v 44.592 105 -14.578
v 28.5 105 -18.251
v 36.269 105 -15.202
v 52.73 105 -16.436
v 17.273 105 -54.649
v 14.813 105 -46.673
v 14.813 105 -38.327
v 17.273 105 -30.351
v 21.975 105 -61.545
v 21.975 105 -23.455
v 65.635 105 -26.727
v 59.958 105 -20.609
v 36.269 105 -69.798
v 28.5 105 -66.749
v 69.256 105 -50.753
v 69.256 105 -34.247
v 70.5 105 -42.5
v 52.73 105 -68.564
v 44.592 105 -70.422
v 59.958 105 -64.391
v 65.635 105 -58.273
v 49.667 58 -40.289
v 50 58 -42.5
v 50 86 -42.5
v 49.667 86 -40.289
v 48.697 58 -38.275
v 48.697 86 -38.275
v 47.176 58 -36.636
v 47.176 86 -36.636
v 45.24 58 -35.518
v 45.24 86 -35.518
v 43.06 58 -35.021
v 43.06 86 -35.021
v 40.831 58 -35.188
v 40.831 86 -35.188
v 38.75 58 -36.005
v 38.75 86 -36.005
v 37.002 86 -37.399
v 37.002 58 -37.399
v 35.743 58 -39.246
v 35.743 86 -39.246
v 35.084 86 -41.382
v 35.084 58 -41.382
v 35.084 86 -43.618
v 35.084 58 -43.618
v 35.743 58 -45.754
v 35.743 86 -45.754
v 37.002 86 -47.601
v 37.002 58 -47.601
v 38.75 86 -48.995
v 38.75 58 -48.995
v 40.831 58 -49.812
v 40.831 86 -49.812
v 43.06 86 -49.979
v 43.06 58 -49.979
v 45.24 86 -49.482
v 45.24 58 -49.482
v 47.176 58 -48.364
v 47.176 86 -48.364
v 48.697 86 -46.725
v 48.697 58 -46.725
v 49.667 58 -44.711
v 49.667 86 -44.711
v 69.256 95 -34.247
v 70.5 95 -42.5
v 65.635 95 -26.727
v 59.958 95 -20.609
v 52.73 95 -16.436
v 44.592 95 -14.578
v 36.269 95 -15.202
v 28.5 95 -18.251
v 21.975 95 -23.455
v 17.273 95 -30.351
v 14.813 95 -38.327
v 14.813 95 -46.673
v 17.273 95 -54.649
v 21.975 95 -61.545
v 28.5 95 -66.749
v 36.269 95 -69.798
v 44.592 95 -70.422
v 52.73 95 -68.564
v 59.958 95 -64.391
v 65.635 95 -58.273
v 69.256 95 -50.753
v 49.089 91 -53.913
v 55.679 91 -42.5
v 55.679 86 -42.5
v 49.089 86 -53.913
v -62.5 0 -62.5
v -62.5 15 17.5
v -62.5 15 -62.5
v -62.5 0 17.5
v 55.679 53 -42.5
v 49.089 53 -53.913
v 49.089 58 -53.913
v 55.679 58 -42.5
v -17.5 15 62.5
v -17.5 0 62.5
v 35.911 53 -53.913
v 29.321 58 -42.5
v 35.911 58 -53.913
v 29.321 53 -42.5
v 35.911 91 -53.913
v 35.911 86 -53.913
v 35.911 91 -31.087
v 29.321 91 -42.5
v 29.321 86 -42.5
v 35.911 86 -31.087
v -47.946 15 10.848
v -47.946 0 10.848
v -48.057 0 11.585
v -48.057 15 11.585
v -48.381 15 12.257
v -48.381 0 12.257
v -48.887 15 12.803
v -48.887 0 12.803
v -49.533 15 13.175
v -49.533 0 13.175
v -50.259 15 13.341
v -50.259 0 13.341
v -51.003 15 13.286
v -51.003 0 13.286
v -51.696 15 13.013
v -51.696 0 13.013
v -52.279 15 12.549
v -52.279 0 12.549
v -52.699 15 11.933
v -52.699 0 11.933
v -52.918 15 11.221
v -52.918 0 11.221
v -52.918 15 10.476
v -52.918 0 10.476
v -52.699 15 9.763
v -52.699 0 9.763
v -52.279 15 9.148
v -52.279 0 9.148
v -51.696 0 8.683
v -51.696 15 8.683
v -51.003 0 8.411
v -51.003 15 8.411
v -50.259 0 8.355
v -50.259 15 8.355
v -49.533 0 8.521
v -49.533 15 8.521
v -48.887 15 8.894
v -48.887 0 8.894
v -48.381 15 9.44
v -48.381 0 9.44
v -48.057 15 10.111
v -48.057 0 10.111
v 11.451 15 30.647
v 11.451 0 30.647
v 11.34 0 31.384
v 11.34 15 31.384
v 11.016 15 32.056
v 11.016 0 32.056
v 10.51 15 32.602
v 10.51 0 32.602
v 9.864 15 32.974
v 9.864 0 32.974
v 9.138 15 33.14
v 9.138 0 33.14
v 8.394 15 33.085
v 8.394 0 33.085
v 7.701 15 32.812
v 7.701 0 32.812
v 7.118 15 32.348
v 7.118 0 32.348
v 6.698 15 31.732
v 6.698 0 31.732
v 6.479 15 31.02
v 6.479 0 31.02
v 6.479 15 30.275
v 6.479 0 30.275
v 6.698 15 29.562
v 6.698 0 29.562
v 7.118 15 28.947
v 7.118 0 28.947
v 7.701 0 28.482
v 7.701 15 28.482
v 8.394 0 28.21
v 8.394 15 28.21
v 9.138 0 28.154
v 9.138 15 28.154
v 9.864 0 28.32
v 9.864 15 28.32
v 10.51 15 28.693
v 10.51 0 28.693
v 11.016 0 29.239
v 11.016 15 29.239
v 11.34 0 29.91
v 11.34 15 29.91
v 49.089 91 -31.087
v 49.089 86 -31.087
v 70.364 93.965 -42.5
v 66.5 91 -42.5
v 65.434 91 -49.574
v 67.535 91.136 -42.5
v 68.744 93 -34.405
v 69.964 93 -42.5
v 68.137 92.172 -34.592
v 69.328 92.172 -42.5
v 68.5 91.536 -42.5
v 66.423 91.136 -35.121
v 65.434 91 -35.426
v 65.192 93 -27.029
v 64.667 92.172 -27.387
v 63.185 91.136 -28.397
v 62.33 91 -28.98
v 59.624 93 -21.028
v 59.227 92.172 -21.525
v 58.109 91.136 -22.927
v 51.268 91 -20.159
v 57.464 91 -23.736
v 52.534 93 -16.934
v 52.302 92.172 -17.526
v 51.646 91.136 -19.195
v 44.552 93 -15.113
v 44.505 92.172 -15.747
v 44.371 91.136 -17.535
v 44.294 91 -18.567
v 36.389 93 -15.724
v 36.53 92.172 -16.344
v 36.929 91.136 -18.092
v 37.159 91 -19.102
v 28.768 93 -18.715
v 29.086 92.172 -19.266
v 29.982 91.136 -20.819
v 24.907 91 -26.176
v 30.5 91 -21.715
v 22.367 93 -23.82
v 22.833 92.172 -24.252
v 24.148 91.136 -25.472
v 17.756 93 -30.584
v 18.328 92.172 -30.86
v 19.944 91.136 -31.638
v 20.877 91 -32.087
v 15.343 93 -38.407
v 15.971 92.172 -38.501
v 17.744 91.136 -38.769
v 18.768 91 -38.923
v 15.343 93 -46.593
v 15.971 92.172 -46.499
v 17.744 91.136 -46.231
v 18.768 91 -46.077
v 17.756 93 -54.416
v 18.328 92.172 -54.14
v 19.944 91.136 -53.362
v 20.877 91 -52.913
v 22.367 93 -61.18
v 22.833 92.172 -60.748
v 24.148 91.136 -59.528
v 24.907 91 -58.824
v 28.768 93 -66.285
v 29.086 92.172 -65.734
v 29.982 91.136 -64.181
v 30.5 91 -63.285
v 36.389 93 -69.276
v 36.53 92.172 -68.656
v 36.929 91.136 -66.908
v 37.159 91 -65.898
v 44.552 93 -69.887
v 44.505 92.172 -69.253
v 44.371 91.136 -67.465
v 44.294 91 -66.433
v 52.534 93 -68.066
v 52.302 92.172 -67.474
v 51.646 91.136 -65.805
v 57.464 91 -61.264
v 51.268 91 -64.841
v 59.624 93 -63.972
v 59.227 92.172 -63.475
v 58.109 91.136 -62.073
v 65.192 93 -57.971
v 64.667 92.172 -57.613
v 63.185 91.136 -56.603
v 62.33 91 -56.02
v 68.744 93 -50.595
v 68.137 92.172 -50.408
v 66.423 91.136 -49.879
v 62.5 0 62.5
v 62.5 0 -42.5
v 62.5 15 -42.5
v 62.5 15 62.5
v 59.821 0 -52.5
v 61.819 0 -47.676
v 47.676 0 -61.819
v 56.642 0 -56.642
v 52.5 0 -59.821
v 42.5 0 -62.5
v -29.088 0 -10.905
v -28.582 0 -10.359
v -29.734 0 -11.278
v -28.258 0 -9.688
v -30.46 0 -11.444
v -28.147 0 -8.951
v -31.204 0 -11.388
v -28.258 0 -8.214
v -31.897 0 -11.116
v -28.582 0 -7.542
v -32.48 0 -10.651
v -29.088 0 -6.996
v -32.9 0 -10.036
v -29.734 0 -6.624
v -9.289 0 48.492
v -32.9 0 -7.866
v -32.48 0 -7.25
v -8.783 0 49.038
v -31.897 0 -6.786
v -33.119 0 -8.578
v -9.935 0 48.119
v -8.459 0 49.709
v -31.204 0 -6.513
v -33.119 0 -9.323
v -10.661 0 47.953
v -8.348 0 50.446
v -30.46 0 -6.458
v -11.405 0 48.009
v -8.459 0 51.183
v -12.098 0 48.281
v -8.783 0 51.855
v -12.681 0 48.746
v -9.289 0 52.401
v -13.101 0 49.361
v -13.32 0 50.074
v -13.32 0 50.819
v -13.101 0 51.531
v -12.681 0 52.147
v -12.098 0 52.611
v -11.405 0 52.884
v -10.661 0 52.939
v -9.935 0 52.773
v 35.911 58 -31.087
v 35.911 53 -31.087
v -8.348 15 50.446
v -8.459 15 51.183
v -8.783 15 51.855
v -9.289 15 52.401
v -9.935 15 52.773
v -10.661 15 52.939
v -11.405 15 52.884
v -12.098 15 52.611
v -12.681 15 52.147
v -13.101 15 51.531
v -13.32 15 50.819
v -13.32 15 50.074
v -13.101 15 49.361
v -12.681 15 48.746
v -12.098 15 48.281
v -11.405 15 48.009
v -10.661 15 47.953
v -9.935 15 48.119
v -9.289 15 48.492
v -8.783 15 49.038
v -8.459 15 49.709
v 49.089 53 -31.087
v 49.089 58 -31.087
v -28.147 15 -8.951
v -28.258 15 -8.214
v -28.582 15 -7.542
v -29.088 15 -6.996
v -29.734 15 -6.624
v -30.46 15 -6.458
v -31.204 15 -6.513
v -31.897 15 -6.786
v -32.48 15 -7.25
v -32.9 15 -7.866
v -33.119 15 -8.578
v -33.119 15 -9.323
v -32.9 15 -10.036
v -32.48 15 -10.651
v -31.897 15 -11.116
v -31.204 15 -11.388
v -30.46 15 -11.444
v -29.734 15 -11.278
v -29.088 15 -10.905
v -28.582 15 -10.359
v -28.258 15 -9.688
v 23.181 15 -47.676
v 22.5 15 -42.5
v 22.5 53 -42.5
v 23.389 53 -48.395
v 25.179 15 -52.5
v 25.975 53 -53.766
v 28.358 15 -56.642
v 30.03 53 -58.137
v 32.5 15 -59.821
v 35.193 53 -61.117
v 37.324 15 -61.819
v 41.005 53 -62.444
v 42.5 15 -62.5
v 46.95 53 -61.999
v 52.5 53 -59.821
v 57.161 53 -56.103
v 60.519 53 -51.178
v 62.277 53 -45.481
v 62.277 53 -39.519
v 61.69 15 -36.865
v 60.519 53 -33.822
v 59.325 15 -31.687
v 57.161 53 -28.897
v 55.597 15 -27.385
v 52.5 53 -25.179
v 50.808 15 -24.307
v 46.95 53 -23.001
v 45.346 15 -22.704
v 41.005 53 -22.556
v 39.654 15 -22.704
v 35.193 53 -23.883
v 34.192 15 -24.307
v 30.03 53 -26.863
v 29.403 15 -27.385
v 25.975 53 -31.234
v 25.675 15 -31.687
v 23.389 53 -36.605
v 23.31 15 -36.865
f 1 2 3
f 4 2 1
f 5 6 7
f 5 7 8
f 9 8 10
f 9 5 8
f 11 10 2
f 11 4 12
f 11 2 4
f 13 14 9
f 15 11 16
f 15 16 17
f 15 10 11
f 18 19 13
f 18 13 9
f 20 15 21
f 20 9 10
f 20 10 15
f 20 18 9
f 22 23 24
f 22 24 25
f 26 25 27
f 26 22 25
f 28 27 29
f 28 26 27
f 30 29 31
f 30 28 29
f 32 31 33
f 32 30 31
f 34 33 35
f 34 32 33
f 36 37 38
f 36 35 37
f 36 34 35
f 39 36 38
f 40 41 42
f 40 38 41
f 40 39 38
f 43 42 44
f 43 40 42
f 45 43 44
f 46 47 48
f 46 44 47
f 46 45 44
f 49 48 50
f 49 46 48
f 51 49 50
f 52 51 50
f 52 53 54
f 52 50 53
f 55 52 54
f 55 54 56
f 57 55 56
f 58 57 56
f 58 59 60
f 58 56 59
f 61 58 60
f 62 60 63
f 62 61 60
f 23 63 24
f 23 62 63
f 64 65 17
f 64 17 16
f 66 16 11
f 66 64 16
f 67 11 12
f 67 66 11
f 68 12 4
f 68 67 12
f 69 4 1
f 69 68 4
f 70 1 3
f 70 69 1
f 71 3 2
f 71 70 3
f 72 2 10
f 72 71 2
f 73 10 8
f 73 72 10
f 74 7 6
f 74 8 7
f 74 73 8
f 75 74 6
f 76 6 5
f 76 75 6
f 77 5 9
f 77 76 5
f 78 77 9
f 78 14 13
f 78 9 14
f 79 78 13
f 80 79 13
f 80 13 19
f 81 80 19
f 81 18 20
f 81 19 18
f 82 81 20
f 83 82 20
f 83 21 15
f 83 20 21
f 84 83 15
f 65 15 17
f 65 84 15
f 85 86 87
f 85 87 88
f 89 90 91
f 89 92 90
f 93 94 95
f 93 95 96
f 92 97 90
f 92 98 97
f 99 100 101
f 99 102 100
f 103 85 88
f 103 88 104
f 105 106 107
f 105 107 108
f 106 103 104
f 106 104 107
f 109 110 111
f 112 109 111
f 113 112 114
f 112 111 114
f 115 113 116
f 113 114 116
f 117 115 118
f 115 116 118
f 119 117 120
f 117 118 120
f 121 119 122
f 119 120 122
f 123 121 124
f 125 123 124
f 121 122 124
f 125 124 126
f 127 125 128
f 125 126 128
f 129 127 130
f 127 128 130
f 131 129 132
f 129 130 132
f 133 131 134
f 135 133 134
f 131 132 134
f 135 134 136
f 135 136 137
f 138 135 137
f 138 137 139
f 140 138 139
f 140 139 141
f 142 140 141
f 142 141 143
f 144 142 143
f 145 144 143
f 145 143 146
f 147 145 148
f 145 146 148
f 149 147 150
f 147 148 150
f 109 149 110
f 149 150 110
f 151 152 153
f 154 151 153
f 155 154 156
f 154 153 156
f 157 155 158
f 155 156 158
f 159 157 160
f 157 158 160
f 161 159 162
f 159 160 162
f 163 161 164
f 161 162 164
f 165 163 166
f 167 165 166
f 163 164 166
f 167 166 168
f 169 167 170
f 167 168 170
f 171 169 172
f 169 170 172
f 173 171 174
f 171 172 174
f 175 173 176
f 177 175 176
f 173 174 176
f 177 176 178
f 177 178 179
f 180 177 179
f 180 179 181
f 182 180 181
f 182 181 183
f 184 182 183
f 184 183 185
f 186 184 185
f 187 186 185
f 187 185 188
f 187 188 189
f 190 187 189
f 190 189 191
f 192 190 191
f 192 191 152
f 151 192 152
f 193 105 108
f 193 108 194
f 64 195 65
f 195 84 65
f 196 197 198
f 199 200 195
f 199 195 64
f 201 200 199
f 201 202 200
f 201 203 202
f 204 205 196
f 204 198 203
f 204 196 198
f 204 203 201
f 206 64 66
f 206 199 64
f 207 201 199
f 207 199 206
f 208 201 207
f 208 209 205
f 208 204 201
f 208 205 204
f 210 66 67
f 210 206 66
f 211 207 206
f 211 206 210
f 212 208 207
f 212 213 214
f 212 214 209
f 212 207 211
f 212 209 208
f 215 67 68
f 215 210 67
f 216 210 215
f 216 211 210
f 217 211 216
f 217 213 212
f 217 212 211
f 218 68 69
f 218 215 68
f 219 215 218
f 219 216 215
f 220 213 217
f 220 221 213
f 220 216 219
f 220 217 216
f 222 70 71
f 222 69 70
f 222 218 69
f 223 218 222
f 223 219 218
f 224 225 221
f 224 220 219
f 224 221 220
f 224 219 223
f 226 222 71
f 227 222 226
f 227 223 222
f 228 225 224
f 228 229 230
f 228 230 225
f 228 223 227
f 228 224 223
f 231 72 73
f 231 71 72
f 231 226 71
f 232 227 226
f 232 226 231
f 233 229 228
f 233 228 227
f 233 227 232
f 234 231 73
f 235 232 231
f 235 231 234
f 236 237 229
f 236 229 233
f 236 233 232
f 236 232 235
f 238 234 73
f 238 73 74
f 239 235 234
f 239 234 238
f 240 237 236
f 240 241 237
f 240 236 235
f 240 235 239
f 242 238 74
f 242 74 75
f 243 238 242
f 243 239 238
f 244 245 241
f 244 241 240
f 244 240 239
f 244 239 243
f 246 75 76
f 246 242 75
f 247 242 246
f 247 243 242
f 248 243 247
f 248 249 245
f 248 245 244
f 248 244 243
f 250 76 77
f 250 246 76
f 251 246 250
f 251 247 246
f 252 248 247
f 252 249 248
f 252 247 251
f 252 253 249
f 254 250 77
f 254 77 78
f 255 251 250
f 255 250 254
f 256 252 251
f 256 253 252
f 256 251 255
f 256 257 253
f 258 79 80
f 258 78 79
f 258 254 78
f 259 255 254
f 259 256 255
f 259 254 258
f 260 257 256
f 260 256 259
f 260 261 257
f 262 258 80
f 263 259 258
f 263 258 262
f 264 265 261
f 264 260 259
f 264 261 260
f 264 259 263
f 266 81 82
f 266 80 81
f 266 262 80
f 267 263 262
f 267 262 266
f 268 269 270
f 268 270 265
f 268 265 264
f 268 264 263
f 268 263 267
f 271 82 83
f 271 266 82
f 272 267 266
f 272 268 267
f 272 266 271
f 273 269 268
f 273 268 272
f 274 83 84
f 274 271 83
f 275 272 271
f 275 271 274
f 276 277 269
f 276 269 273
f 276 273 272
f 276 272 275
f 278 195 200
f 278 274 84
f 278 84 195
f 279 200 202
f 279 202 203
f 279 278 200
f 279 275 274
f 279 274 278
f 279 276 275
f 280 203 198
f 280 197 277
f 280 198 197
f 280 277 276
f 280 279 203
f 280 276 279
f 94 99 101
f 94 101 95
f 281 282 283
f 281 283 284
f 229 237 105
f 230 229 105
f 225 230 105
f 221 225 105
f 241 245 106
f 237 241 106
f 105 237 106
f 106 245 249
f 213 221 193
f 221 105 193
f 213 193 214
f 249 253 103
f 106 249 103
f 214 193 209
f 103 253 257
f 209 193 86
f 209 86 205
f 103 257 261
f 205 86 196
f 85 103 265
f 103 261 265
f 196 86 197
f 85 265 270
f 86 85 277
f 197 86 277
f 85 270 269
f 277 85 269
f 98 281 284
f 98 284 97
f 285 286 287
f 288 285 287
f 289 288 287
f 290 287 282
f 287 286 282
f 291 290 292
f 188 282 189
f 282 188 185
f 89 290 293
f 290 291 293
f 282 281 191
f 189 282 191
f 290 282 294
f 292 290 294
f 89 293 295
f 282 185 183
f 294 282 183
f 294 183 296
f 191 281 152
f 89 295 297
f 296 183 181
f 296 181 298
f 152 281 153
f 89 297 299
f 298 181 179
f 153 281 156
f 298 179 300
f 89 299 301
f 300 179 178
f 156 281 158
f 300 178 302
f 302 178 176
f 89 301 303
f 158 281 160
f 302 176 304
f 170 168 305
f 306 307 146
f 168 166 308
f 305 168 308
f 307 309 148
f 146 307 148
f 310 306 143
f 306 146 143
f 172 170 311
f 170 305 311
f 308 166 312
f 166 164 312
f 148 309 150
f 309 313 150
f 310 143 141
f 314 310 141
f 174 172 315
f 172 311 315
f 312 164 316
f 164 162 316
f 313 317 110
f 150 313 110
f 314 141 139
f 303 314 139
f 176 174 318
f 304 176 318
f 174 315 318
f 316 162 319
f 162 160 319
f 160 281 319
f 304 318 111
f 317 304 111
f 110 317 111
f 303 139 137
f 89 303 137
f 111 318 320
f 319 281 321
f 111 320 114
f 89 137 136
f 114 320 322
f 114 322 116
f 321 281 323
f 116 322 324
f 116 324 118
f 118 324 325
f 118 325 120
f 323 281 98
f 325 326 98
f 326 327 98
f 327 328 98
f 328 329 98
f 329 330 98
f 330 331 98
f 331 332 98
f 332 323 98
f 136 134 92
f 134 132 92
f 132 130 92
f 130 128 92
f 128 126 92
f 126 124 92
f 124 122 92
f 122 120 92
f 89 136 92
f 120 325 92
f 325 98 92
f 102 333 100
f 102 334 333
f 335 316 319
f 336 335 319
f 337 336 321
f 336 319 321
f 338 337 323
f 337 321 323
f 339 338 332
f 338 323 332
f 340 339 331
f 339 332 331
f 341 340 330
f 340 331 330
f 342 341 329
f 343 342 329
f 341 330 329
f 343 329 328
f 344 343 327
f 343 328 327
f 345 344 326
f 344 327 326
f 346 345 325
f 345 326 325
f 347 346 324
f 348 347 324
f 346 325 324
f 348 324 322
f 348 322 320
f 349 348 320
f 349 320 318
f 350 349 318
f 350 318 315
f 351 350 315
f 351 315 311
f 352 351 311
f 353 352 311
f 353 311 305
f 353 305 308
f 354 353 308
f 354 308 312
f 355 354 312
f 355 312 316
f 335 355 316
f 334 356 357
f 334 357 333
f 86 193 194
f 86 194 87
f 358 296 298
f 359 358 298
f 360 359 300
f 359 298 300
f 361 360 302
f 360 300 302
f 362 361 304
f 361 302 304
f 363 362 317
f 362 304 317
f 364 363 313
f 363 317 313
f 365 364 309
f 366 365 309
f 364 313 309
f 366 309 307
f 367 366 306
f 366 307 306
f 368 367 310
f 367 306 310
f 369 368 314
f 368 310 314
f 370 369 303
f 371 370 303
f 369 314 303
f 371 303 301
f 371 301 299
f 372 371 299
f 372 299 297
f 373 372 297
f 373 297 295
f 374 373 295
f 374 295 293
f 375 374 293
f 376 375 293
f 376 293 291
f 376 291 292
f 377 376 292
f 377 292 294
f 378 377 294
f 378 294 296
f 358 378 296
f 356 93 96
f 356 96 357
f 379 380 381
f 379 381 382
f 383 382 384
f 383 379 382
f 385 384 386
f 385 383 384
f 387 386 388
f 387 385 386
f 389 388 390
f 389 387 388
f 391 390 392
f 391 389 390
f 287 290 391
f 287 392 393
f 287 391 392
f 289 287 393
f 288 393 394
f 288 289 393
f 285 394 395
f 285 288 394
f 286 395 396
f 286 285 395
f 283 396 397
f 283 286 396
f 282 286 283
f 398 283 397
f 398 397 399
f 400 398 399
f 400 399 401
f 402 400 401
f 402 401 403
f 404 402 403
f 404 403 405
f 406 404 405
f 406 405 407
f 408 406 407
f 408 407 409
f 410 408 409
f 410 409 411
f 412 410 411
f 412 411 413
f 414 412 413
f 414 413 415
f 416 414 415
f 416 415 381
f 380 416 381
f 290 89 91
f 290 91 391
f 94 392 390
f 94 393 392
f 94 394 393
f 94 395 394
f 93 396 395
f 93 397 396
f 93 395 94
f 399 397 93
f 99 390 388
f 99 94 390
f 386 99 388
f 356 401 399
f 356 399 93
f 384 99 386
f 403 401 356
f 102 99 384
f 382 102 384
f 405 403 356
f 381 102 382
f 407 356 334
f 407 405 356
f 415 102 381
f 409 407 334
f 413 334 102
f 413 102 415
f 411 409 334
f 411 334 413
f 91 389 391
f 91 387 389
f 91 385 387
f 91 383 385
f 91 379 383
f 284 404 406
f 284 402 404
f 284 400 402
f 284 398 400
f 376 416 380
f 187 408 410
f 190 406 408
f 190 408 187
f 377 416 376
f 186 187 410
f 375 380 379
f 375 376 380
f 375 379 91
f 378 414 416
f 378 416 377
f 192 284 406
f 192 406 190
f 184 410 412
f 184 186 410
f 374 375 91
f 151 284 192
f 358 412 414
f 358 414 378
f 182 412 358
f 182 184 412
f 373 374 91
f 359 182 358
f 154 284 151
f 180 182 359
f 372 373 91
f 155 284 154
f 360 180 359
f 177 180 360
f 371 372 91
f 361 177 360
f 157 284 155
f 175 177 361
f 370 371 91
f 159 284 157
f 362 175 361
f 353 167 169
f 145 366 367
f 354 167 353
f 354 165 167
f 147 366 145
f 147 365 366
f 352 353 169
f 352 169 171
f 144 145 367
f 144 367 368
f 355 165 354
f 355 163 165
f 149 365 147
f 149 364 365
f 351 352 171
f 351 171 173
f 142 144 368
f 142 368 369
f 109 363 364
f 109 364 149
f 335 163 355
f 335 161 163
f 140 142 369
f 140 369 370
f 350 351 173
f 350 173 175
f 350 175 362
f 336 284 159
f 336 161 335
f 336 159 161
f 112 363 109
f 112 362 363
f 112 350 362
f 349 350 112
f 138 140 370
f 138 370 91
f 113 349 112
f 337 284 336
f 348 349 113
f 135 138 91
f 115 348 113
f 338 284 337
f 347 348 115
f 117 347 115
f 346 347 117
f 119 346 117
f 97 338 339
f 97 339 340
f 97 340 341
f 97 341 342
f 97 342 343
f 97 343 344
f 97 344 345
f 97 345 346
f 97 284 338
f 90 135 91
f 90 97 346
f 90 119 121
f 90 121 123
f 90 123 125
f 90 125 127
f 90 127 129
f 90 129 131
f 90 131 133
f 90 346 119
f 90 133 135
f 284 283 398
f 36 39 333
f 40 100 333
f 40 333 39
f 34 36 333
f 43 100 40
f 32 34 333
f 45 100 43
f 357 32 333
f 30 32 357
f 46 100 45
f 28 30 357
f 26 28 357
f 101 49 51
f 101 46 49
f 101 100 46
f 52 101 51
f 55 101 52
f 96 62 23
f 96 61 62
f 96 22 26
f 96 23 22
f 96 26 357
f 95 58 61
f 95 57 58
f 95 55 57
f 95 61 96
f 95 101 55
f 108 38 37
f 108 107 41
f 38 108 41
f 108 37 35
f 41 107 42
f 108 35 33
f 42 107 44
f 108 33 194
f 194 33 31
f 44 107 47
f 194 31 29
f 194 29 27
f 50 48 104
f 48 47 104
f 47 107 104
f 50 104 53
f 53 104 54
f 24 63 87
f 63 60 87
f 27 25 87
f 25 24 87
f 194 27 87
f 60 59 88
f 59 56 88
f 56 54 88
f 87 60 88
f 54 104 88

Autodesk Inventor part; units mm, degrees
ref_plane "YZ Plane" through (0, 0, 0) normal (1, 0, 0) x (0, 1, 0)
ref_plane "XZ Plane" through (0, 0, 0) normal (0, 1, 0) x (-1, 0, 0)
ref_plane "XY Plane" through (0, 0, 0) normal (0, 0, 1) x (1, 0, 0)
sketch "スケッチ1" plane through (0, 0, 0) normal (0, 1, 0) x (-1, 0, 0)
  line L0 (62.5, -62.5) -> (-42.5, -62.5)
  line L1 (-62.5, -42.5) -> (-62.5, 62.5)
  line L2 (-62.5, 62.5) -> (62.5, 62.5)
  line L3 (62.5, 62.5) -> (62.5, -62.5)
  line L4 (62.5, -62.5) -> (-62.5, 62.5) construction
  line L5 (-62.5, -62.5) -> (62.5, 62.5) construction
  line L6 (17.5, 62.5) -> (62.5, 17.5)
  circle A0 centre (-42.5, -42.5) radius 20
  point P0 (0, 0)
  dimension "d0" = 125
  dimension "d1" = 125
  dimension "d2" = 80
  dimension "d3" = 80
  dimension "d4" = 40
  dimension "d5" = 20
extrude "押し出し1" add sketch "スケッチ1" along normal blind 15 contours L0 A0 L1 L2 L6 L3
extrude "押し出し2" add sketch "スケッチ1" along normal blind 53 contours A0
sketch "スケッチ2" plane through (42.5, 53, -42.5) normal (0, 1, 0) x (1, 0, 0)
  point P0 (-42.5, -42.5)
sketch "スケッチ3" plane through (42.5, 53, -42.5) normal (0, 1, 0) x (1, 0, 0)
  circle A0 centre (0, 0) radius 20 projected
  circle A1 centre (0, 0) radius 7.5
  line L0 (13.1788, 0) -> (6.5894, -11.4132)
  line L1 (6.5894, -11.4132) -> (-6.5894, -11.4132)
  line L2 (-6.5894, -11.4132) -> (-13.1788, 0)
  line L3 (-13.1788, 0) -> (-6.5894, 11.4132)
  line L4 (-6.5894, 11.4132) -> (6.5894, 11.4132)
  line L5 (6.5894, 11.4132) -> (13.1788, 0)
  point P0 (-42.5, -42.5)
  dimension "d10" = 15
extrude "押し出し3" add sketch "スケッチ3" along normal blind 38 contours A1
extrude "押し出し4" add sketch "スケッチ3" along normal blind 5 contours L0 L1 L2 L3 L4 L5
sketch "スケッチ4" plane through (42.5, 91, -42.5) normal (0, 1, 0) x (1, 0, 0)
  circle A0 centre (0, 0) radius 7.5 projected
  line L0 (6.5894, -11.4132) -> (13.1788, 0) projected
  line L1 (13.1788, 0) -> (6.5894, 11.4132) projected
  line L2 (6.5894, 11.4132) -> (-6.5894, 11.4132) projected
  line L3 (-6.5894, 11.4132) -> (-13.1788, 0) projected
  line L4 (-13.1788, 0) -> (-6.5894, -11.4132) projected
  line L5 (-6.5894, -11.4132) -> (6.5894, -11.4132) projected
  circle A1 centre (0, 0) radius 7.5 projected
  point P0 (-42.5, -42.5)
extrude "押し出し5" add sketch "スケッチ4" against normal blind 5
thread "ねじ1" size "M15x1.5" class "6g" standard "ANSI Metric M Profile" full length
sketch "スケッチ5" plane through (42.5, 91, -42.5) normal (0, 1, 0) x (1, 0, 0)
  circle A0 centre (0, 0) radius 28
  point P0 (-42.5, -42.5)
  dimension "d19" = 56
extrude "押し出し6" add sketch "スケッチ5" along normal blind 14
fillet "フィレット1" radius 4 1 edges at (14.5, 91, -42.5)
sketch "スケッチ7" plane through (0, 0, 0) normal (0, -1, 0) x (1, 0, 0)
  point P0 (0, 0)
sketch "スケッチ8" plane through (0, 0, 0) normal (0, -1, 0) x (1, 0, 0)
  circle A0 centre (-50.4462, 10.8482) radius 2.5
  line L0 (62.5, -62.5) -> (-62.5, 62.5) construction
  circle A1 centre (-10.8482, 50.4462) radius 2.5
  circle A2 centre (-30.6472, -8.9508) radius 2.5
  line L1 (-50.4462, 10.8482) -> (-10.8482, 50.4462)
  circle A3 centre (8.9508, 30.6472) radius 2.5
  line L2 (-30.6472, -8.9508) -> (8.9508, 30.6472)
  point P0 (0, 0)
  dimension "d23" = 5
  dimension "d24" = 28
  dimension "d25" = 5
  dimension "d26" = 28
  dimension "d27" = 28
extrude "押し出し7" cut sketch "スケッチ8" against normal blind 15
properties part number "foot"
